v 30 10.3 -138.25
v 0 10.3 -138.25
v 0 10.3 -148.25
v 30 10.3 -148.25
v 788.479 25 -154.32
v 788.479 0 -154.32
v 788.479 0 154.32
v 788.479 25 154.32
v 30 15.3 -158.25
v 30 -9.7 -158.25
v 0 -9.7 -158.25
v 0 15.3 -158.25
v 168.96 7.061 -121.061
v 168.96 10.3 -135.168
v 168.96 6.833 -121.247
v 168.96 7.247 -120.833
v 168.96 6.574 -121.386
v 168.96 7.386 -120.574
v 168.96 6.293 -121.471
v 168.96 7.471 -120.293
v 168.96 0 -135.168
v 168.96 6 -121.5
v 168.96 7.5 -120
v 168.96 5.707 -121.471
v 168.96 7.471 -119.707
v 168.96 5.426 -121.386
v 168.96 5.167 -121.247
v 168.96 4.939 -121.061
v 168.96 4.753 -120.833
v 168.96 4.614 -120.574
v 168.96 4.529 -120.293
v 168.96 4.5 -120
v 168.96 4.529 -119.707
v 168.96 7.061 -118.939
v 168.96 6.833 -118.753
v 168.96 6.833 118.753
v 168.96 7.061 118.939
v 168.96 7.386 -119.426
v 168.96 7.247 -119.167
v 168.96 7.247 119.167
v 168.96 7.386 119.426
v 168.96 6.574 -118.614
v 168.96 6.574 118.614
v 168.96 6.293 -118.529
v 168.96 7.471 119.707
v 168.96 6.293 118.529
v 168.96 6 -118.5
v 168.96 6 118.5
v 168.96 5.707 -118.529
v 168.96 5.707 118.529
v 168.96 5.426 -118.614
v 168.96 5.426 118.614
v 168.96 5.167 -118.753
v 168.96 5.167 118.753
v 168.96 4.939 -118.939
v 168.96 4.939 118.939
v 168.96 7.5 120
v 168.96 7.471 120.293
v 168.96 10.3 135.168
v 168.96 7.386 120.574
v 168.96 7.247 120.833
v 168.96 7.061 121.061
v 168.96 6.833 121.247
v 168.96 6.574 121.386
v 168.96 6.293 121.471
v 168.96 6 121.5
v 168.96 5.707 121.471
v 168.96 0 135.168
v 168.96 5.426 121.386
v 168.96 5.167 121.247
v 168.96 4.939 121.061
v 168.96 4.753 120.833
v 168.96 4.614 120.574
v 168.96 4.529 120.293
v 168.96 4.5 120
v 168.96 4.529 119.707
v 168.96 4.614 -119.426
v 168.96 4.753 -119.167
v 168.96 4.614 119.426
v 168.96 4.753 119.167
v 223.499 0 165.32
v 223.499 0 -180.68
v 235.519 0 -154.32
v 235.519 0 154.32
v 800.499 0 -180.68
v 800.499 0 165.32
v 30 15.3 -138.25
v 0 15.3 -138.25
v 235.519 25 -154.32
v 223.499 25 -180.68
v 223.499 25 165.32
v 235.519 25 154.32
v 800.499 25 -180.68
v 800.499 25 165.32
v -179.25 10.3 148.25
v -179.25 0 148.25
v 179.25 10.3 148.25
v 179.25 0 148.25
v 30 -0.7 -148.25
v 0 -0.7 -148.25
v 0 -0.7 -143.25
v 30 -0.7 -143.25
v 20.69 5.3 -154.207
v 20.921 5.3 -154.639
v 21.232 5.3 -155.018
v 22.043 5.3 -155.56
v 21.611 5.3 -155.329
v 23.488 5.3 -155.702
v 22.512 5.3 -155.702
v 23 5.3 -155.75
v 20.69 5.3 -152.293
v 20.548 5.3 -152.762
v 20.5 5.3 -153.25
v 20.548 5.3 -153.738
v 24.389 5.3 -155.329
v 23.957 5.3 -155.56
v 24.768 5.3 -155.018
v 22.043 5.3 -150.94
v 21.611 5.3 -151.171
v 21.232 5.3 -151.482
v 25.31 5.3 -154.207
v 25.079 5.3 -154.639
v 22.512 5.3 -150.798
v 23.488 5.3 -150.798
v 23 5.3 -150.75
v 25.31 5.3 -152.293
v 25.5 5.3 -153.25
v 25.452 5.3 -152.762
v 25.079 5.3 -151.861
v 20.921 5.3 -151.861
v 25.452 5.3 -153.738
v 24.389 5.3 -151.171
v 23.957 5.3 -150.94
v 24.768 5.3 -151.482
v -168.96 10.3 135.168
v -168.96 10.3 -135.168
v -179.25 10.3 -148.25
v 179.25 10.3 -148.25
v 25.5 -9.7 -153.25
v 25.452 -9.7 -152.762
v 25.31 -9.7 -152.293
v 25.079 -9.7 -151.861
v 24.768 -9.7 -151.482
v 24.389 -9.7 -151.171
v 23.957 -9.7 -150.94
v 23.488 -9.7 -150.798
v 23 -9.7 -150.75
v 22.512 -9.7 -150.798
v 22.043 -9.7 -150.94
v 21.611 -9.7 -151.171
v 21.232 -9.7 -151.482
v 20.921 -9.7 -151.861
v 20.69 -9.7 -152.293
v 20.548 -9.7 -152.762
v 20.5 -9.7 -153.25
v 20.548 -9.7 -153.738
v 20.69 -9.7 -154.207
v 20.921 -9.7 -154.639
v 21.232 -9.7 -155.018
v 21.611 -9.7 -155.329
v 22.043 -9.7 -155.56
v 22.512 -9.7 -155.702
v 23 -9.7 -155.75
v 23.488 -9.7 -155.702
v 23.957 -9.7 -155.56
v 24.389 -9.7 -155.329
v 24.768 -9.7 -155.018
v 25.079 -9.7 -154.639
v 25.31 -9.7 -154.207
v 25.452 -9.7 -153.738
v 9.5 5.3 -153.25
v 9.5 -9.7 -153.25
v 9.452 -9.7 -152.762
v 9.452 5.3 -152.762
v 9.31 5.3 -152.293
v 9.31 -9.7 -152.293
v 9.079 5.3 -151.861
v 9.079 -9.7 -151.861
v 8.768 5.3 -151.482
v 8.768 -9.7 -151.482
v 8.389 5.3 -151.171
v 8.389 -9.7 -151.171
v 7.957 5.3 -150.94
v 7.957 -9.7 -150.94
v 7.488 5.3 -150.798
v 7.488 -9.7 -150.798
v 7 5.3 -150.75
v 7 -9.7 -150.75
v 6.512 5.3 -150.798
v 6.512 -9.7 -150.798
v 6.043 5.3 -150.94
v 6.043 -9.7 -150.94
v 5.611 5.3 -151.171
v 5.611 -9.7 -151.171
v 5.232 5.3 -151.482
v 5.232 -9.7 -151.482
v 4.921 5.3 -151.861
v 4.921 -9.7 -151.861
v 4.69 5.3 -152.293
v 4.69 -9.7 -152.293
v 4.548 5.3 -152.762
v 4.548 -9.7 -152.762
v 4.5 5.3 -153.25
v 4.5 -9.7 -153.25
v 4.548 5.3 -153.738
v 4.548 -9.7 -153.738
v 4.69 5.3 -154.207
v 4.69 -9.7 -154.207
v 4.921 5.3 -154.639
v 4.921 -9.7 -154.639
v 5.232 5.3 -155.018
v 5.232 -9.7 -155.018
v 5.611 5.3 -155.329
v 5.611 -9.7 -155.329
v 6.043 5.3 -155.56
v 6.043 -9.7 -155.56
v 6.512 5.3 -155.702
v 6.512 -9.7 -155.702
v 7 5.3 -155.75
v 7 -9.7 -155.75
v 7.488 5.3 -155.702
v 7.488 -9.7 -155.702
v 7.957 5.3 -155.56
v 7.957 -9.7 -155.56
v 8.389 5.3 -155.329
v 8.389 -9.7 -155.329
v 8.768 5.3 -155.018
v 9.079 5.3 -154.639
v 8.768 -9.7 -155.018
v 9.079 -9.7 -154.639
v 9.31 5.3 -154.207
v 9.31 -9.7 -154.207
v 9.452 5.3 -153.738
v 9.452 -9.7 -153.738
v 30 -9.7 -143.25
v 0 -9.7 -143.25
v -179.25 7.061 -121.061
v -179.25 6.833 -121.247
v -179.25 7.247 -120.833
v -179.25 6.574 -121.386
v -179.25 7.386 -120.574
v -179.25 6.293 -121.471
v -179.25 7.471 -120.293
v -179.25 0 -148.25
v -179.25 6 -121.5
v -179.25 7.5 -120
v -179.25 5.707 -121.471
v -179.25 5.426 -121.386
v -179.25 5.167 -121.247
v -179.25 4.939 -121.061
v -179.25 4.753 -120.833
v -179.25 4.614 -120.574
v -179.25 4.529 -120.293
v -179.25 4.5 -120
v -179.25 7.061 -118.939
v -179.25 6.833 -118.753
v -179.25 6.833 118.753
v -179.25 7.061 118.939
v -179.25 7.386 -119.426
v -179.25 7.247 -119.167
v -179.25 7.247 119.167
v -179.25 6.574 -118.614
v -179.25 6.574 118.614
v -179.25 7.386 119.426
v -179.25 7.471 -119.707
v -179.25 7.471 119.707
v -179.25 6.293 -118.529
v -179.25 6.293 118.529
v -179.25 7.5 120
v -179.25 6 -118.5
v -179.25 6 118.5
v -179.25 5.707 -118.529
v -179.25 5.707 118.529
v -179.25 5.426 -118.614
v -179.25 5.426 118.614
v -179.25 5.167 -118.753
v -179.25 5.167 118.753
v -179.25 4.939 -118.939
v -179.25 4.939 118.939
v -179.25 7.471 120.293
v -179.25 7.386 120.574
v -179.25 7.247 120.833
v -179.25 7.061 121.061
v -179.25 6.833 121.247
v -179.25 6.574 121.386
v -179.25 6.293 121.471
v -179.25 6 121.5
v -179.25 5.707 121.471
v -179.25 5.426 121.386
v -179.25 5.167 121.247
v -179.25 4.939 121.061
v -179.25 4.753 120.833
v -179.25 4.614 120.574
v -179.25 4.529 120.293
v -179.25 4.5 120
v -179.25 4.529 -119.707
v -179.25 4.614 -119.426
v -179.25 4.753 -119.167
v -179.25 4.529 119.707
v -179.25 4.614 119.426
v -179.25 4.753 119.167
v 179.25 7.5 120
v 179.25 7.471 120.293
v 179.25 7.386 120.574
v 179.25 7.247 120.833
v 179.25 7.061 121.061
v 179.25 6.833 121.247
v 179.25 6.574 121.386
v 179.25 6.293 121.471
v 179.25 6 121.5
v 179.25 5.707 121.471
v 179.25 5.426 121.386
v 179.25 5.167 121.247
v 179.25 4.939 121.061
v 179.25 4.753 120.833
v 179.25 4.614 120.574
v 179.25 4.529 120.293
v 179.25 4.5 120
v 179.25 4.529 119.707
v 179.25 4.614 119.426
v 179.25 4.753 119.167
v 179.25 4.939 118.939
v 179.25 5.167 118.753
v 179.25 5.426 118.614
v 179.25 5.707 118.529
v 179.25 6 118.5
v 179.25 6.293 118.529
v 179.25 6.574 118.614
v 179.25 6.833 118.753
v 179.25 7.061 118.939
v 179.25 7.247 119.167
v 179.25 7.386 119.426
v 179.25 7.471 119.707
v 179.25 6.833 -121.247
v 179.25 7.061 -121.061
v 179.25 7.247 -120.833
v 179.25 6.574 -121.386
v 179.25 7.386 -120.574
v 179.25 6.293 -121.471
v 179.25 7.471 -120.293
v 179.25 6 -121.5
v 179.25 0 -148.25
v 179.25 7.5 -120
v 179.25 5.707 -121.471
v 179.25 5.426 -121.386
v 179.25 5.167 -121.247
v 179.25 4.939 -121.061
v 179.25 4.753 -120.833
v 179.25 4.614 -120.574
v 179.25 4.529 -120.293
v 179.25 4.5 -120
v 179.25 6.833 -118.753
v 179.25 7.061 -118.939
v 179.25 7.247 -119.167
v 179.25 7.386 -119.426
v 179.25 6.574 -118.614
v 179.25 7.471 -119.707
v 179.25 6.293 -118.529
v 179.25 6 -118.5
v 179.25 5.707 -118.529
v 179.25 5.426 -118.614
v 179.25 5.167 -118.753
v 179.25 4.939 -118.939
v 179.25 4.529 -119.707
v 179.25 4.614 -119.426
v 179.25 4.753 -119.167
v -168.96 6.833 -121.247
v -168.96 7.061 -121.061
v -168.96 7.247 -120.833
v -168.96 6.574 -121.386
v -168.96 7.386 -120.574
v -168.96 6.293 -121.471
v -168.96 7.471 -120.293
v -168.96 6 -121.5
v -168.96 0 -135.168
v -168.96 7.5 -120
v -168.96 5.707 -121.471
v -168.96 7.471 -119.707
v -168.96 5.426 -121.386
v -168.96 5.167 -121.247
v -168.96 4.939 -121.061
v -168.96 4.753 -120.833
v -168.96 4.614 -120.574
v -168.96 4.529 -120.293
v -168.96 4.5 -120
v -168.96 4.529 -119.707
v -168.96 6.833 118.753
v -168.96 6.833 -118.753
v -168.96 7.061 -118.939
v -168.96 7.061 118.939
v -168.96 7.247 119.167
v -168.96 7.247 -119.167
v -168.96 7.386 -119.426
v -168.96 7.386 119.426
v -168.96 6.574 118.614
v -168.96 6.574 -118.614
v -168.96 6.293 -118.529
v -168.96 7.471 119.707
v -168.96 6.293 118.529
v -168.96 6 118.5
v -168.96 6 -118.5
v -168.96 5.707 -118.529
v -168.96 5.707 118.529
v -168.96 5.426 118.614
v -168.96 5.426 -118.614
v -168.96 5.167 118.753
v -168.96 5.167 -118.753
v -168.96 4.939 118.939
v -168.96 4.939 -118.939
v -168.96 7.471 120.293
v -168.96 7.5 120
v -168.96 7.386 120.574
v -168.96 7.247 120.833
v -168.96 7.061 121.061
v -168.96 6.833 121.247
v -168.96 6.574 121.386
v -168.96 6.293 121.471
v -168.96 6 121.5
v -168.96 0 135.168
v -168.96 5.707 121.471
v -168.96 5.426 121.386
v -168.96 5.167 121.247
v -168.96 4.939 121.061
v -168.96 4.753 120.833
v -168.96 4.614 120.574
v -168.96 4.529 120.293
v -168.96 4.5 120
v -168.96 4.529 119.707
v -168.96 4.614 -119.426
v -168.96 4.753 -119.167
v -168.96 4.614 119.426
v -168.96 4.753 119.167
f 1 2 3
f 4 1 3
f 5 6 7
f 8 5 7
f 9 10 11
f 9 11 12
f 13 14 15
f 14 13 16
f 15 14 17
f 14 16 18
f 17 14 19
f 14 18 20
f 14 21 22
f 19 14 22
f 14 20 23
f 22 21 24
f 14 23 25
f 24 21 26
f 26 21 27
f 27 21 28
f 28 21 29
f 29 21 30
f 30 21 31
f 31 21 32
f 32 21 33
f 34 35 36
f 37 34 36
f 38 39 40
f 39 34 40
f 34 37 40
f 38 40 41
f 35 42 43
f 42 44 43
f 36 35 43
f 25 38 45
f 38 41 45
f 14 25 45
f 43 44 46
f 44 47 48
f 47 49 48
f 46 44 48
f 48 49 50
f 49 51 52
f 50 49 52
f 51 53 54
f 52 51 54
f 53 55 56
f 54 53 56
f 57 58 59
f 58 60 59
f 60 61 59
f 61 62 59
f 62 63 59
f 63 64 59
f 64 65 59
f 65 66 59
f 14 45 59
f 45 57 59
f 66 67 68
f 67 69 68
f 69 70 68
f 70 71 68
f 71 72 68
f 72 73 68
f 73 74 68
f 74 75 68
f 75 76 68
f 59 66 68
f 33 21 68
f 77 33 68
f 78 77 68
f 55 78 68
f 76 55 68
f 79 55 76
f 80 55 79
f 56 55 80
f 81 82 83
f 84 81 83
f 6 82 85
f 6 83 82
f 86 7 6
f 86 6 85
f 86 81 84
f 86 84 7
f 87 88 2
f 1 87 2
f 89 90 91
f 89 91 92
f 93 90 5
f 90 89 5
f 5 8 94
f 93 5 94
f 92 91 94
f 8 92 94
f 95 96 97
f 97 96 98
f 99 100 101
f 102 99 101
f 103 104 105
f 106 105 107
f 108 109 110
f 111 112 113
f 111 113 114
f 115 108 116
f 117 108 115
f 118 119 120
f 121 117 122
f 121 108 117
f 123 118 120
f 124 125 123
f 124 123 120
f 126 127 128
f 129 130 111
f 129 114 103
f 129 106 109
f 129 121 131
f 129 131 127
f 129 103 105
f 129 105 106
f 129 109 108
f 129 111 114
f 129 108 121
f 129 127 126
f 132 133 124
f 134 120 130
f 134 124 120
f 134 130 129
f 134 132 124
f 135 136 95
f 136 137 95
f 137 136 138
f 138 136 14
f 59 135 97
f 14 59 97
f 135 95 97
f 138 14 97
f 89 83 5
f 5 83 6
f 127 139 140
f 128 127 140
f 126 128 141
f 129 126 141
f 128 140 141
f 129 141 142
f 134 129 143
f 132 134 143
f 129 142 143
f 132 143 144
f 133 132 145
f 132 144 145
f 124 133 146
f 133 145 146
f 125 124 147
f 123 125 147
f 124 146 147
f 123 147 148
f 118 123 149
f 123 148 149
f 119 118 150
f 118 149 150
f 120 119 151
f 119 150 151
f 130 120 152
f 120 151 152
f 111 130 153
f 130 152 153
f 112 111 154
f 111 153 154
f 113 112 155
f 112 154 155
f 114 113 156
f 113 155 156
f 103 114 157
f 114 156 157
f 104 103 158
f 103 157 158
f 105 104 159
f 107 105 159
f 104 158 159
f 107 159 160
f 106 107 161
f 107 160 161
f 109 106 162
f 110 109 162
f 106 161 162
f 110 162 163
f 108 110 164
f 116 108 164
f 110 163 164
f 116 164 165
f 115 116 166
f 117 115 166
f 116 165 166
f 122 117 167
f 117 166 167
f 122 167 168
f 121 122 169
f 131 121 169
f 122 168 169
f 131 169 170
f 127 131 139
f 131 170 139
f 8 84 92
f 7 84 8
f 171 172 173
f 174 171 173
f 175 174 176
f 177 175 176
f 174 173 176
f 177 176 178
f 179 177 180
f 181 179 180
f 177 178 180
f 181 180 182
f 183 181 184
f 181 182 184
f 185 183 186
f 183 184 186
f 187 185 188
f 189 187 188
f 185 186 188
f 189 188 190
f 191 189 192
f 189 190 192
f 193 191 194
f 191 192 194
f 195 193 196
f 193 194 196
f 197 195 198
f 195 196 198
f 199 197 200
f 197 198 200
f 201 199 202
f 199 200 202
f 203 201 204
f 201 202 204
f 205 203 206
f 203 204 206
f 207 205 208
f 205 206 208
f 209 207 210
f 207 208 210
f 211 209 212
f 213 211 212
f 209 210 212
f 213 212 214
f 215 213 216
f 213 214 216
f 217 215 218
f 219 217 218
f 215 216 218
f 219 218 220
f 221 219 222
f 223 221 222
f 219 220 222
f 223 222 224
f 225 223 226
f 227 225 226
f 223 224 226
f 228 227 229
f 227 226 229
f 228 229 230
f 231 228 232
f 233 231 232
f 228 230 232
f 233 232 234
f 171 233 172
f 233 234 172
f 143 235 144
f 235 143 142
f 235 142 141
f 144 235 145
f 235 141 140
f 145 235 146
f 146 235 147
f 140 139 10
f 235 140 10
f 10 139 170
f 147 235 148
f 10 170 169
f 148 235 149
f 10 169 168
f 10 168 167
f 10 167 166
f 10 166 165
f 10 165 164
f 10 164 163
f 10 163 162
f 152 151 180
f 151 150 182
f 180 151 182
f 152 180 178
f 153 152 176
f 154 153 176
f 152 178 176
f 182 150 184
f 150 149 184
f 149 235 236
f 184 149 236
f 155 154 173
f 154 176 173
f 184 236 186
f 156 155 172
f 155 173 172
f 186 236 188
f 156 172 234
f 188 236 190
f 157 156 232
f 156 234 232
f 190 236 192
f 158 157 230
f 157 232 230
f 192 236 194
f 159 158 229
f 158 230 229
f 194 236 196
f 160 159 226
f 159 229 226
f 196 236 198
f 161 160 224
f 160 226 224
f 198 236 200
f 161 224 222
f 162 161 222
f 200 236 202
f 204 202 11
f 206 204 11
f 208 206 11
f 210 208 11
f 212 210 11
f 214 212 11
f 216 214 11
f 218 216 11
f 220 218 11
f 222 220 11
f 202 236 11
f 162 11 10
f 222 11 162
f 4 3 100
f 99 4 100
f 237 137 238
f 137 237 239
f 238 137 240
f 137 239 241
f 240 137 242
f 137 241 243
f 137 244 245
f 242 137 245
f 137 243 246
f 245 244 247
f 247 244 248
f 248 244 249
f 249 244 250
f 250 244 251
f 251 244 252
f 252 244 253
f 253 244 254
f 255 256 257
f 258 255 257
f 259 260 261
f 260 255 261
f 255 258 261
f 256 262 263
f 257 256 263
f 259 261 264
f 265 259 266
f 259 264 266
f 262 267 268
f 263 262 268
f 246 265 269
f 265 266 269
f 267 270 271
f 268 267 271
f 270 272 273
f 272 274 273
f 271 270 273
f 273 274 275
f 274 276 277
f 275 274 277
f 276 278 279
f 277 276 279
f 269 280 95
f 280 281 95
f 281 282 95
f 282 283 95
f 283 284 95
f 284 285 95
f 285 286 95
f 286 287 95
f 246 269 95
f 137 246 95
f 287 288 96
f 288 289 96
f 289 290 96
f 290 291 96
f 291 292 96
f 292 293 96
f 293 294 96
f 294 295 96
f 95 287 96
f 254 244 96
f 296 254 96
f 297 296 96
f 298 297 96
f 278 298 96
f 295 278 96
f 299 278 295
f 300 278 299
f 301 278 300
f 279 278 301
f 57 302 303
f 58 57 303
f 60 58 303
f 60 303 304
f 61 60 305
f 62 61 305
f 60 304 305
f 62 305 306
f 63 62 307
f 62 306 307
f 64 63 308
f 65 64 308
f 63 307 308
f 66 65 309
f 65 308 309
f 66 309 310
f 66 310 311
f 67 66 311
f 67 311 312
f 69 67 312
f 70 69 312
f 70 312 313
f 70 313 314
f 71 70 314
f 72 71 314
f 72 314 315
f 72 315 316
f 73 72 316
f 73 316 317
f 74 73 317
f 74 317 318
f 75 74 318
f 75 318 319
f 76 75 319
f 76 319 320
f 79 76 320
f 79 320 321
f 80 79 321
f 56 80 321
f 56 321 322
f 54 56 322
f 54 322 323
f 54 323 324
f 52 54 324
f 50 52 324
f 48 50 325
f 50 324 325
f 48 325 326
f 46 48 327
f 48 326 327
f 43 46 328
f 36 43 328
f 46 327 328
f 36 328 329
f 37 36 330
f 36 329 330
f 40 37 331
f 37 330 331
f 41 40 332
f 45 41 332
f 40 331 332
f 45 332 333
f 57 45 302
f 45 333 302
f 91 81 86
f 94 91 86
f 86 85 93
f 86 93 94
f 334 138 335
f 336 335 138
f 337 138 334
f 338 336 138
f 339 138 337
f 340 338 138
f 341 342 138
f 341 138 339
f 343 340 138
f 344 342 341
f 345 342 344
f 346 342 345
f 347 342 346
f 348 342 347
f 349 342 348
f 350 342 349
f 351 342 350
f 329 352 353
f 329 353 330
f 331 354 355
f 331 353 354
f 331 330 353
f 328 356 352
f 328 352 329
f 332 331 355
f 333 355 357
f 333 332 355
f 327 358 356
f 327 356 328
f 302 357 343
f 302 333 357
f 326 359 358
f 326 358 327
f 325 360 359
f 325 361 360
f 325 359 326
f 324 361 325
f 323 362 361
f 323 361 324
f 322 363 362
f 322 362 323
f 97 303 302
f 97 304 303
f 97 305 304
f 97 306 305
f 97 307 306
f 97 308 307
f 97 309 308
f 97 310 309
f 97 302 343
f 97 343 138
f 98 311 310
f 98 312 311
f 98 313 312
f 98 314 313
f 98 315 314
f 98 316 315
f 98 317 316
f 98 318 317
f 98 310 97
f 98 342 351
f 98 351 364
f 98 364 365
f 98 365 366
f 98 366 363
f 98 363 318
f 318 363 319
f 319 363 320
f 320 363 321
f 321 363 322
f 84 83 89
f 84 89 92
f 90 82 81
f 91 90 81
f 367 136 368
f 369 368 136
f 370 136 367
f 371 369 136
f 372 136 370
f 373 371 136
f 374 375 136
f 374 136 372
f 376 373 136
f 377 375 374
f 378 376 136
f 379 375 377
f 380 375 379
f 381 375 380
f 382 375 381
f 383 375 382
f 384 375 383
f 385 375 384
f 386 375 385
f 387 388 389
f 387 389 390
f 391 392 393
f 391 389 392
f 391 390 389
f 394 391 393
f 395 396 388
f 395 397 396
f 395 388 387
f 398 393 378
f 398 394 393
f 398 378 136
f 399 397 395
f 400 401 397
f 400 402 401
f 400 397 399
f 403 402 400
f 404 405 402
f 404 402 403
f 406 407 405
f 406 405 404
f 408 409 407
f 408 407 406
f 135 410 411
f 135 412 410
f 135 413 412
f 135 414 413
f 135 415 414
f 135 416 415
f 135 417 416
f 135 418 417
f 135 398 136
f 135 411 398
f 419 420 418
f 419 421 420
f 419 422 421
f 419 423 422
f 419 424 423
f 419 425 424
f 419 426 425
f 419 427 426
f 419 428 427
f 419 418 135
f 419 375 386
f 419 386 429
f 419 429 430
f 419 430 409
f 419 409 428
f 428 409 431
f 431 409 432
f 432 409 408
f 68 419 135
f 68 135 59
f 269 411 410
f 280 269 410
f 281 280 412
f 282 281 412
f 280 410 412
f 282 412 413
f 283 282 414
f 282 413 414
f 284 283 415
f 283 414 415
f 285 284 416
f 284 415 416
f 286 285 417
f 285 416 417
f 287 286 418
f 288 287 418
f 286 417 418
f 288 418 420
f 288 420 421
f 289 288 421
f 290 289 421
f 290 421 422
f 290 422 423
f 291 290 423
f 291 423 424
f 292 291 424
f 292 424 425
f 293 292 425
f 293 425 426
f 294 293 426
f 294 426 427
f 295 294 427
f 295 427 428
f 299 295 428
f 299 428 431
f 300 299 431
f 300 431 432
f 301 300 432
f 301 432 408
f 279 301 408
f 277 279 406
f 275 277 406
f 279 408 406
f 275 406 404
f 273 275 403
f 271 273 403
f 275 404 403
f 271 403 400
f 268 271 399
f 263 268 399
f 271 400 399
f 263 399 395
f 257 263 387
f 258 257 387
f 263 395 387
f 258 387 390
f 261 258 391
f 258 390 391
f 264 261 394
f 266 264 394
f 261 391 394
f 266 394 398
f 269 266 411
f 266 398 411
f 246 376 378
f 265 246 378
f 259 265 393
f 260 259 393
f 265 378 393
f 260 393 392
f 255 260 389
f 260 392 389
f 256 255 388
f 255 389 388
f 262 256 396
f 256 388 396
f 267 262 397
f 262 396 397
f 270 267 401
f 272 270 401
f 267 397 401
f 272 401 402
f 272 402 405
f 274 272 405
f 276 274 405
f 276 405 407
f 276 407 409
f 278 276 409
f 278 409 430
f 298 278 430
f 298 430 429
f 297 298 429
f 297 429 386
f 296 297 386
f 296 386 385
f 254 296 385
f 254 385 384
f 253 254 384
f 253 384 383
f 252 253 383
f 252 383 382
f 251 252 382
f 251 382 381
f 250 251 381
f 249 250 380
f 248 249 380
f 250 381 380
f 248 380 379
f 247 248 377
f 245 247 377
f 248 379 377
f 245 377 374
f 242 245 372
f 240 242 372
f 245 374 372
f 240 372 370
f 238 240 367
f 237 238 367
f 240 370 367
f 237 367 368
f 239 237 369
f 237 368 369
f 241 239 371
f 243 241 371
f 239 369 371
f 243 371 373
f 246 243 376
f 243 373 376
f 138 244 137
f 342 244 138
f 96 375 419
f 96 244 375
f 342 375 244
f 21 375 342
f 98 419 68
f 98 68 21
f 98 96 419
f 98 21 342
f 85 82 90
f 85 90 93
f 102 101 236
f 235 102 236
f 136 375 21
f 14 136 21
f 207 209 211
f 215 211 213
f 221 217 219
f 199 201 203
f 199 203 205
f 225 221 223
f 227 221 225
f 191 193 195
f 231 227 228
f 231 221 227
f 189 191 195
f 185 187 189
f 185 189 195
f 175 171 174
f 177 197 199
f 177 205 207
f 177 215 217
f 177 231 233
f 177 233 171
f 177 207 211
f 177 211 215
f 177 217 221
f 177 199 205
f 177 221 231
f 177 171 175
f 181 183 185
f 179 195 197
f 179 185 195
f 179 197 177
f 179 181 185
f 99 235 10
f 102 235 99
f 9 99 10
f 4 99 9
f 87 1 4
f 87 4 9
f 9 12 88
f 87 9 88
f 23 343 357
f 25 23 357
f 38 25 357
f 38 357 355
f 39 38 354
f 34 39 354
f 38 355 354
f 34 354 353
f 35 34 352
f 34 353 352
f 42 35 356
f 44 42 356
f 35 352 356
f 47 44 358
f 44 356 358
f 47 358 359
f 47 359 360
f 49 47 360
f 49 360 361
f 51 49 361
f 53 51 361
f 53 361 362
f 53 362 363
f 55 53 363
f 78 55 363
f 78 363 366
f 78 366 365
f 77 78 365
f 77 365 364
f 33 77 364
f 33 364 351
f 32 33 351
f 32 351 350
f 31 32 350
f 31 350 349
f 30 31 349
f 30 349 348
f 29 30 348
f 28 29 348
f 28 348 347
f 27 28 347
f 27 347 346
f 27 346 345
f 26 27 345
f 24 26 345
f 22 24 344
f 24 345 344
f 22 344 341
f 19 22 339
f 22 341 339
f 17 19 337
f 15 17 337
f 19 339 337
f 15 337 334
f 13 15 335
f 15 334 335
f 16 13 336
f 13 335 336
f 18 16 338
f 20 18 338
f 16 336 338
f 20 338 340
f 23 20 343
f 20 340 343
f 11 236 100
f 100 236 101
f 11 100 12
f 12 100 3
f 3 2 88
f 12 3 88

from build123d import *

# Parameters (mm, degrees)
F0_W     = 358.5
F0_H     = 296.5
F0_W_2   = 337.92
F0_H_2   = 270.336
F1_DEPTH = 10.3
F2_R     = 1.5
F3_DEPTH = 390
F5_DEPTH = 30
F6_R     = 2.5
F7_DEPTH = 15
F8_W     = 577
F8_H     = 346
F8_W_2   = 552.96
F8_H_2   = 308.64
F9_DEPTH = 25


with BuildPart() as f1:
    # F0 (on Front) → F1 (new body)
    with BuildSketch(Plane.XZ):
        Rectangle(F0_W, F0_H)
        Rectangle(F0_W_2, F0_H_2, mode=Mode.SUBTRACT)
    extrude(amount=-F1_DEPTH)

    # F2 (on face) → F3 (cut)
    with BuildSketch(Plane.YZ.offset(179.25)):
        with Locations((6, 120)):
            Circle(F2_R)
        with Locations((6, -120)):
            Circle(F2_R)
    extrude(amount=-F3_DEPTH, mode=Mode.SUBTRACT)


with BuildPart() as f5:
    # F4 (on Right) → F5 (new body)
    with BuildSketch(Plane.YZ):
        Polygon((-9.7, -158.25), (15.3, -158.25), (15.3, -138.25), (10.3, -138.25), (10.3, -148.25), (-0.7, -148.25), (-0.7, -143.25), (-9.7, -143.25), align=None)
    extrude(amount=F5_DEPTH)

    # F6 (on face) → F7 (cut)
    with BuildSketch(Plane.XZ.offset(9.7)):
        with Locations((7, -153.25)):
            Circle(F6_R)
        with Locations((23, -153.25)):
            Circle(F6_R)
    extrude(amount=-F7_DEPTH, mode=Mode.SUBTRACT)


with BuildPart() as f9:
    # F8 (on Front) → F9 (new body)
    with BuildSketch(Plane.XZ):
        with Locations((511.998723, -7.68)):
            Rectangle(F8_W, F8_H)
        with Locations((511.998723, 0)):
            Rectangle(F8_W_2, F8_H_2, mode=Mode.SUBTRACT)
    extrude(amount=-F9_DEPTH)


solid = Compound([f1.part, f5.part, f9.part])
